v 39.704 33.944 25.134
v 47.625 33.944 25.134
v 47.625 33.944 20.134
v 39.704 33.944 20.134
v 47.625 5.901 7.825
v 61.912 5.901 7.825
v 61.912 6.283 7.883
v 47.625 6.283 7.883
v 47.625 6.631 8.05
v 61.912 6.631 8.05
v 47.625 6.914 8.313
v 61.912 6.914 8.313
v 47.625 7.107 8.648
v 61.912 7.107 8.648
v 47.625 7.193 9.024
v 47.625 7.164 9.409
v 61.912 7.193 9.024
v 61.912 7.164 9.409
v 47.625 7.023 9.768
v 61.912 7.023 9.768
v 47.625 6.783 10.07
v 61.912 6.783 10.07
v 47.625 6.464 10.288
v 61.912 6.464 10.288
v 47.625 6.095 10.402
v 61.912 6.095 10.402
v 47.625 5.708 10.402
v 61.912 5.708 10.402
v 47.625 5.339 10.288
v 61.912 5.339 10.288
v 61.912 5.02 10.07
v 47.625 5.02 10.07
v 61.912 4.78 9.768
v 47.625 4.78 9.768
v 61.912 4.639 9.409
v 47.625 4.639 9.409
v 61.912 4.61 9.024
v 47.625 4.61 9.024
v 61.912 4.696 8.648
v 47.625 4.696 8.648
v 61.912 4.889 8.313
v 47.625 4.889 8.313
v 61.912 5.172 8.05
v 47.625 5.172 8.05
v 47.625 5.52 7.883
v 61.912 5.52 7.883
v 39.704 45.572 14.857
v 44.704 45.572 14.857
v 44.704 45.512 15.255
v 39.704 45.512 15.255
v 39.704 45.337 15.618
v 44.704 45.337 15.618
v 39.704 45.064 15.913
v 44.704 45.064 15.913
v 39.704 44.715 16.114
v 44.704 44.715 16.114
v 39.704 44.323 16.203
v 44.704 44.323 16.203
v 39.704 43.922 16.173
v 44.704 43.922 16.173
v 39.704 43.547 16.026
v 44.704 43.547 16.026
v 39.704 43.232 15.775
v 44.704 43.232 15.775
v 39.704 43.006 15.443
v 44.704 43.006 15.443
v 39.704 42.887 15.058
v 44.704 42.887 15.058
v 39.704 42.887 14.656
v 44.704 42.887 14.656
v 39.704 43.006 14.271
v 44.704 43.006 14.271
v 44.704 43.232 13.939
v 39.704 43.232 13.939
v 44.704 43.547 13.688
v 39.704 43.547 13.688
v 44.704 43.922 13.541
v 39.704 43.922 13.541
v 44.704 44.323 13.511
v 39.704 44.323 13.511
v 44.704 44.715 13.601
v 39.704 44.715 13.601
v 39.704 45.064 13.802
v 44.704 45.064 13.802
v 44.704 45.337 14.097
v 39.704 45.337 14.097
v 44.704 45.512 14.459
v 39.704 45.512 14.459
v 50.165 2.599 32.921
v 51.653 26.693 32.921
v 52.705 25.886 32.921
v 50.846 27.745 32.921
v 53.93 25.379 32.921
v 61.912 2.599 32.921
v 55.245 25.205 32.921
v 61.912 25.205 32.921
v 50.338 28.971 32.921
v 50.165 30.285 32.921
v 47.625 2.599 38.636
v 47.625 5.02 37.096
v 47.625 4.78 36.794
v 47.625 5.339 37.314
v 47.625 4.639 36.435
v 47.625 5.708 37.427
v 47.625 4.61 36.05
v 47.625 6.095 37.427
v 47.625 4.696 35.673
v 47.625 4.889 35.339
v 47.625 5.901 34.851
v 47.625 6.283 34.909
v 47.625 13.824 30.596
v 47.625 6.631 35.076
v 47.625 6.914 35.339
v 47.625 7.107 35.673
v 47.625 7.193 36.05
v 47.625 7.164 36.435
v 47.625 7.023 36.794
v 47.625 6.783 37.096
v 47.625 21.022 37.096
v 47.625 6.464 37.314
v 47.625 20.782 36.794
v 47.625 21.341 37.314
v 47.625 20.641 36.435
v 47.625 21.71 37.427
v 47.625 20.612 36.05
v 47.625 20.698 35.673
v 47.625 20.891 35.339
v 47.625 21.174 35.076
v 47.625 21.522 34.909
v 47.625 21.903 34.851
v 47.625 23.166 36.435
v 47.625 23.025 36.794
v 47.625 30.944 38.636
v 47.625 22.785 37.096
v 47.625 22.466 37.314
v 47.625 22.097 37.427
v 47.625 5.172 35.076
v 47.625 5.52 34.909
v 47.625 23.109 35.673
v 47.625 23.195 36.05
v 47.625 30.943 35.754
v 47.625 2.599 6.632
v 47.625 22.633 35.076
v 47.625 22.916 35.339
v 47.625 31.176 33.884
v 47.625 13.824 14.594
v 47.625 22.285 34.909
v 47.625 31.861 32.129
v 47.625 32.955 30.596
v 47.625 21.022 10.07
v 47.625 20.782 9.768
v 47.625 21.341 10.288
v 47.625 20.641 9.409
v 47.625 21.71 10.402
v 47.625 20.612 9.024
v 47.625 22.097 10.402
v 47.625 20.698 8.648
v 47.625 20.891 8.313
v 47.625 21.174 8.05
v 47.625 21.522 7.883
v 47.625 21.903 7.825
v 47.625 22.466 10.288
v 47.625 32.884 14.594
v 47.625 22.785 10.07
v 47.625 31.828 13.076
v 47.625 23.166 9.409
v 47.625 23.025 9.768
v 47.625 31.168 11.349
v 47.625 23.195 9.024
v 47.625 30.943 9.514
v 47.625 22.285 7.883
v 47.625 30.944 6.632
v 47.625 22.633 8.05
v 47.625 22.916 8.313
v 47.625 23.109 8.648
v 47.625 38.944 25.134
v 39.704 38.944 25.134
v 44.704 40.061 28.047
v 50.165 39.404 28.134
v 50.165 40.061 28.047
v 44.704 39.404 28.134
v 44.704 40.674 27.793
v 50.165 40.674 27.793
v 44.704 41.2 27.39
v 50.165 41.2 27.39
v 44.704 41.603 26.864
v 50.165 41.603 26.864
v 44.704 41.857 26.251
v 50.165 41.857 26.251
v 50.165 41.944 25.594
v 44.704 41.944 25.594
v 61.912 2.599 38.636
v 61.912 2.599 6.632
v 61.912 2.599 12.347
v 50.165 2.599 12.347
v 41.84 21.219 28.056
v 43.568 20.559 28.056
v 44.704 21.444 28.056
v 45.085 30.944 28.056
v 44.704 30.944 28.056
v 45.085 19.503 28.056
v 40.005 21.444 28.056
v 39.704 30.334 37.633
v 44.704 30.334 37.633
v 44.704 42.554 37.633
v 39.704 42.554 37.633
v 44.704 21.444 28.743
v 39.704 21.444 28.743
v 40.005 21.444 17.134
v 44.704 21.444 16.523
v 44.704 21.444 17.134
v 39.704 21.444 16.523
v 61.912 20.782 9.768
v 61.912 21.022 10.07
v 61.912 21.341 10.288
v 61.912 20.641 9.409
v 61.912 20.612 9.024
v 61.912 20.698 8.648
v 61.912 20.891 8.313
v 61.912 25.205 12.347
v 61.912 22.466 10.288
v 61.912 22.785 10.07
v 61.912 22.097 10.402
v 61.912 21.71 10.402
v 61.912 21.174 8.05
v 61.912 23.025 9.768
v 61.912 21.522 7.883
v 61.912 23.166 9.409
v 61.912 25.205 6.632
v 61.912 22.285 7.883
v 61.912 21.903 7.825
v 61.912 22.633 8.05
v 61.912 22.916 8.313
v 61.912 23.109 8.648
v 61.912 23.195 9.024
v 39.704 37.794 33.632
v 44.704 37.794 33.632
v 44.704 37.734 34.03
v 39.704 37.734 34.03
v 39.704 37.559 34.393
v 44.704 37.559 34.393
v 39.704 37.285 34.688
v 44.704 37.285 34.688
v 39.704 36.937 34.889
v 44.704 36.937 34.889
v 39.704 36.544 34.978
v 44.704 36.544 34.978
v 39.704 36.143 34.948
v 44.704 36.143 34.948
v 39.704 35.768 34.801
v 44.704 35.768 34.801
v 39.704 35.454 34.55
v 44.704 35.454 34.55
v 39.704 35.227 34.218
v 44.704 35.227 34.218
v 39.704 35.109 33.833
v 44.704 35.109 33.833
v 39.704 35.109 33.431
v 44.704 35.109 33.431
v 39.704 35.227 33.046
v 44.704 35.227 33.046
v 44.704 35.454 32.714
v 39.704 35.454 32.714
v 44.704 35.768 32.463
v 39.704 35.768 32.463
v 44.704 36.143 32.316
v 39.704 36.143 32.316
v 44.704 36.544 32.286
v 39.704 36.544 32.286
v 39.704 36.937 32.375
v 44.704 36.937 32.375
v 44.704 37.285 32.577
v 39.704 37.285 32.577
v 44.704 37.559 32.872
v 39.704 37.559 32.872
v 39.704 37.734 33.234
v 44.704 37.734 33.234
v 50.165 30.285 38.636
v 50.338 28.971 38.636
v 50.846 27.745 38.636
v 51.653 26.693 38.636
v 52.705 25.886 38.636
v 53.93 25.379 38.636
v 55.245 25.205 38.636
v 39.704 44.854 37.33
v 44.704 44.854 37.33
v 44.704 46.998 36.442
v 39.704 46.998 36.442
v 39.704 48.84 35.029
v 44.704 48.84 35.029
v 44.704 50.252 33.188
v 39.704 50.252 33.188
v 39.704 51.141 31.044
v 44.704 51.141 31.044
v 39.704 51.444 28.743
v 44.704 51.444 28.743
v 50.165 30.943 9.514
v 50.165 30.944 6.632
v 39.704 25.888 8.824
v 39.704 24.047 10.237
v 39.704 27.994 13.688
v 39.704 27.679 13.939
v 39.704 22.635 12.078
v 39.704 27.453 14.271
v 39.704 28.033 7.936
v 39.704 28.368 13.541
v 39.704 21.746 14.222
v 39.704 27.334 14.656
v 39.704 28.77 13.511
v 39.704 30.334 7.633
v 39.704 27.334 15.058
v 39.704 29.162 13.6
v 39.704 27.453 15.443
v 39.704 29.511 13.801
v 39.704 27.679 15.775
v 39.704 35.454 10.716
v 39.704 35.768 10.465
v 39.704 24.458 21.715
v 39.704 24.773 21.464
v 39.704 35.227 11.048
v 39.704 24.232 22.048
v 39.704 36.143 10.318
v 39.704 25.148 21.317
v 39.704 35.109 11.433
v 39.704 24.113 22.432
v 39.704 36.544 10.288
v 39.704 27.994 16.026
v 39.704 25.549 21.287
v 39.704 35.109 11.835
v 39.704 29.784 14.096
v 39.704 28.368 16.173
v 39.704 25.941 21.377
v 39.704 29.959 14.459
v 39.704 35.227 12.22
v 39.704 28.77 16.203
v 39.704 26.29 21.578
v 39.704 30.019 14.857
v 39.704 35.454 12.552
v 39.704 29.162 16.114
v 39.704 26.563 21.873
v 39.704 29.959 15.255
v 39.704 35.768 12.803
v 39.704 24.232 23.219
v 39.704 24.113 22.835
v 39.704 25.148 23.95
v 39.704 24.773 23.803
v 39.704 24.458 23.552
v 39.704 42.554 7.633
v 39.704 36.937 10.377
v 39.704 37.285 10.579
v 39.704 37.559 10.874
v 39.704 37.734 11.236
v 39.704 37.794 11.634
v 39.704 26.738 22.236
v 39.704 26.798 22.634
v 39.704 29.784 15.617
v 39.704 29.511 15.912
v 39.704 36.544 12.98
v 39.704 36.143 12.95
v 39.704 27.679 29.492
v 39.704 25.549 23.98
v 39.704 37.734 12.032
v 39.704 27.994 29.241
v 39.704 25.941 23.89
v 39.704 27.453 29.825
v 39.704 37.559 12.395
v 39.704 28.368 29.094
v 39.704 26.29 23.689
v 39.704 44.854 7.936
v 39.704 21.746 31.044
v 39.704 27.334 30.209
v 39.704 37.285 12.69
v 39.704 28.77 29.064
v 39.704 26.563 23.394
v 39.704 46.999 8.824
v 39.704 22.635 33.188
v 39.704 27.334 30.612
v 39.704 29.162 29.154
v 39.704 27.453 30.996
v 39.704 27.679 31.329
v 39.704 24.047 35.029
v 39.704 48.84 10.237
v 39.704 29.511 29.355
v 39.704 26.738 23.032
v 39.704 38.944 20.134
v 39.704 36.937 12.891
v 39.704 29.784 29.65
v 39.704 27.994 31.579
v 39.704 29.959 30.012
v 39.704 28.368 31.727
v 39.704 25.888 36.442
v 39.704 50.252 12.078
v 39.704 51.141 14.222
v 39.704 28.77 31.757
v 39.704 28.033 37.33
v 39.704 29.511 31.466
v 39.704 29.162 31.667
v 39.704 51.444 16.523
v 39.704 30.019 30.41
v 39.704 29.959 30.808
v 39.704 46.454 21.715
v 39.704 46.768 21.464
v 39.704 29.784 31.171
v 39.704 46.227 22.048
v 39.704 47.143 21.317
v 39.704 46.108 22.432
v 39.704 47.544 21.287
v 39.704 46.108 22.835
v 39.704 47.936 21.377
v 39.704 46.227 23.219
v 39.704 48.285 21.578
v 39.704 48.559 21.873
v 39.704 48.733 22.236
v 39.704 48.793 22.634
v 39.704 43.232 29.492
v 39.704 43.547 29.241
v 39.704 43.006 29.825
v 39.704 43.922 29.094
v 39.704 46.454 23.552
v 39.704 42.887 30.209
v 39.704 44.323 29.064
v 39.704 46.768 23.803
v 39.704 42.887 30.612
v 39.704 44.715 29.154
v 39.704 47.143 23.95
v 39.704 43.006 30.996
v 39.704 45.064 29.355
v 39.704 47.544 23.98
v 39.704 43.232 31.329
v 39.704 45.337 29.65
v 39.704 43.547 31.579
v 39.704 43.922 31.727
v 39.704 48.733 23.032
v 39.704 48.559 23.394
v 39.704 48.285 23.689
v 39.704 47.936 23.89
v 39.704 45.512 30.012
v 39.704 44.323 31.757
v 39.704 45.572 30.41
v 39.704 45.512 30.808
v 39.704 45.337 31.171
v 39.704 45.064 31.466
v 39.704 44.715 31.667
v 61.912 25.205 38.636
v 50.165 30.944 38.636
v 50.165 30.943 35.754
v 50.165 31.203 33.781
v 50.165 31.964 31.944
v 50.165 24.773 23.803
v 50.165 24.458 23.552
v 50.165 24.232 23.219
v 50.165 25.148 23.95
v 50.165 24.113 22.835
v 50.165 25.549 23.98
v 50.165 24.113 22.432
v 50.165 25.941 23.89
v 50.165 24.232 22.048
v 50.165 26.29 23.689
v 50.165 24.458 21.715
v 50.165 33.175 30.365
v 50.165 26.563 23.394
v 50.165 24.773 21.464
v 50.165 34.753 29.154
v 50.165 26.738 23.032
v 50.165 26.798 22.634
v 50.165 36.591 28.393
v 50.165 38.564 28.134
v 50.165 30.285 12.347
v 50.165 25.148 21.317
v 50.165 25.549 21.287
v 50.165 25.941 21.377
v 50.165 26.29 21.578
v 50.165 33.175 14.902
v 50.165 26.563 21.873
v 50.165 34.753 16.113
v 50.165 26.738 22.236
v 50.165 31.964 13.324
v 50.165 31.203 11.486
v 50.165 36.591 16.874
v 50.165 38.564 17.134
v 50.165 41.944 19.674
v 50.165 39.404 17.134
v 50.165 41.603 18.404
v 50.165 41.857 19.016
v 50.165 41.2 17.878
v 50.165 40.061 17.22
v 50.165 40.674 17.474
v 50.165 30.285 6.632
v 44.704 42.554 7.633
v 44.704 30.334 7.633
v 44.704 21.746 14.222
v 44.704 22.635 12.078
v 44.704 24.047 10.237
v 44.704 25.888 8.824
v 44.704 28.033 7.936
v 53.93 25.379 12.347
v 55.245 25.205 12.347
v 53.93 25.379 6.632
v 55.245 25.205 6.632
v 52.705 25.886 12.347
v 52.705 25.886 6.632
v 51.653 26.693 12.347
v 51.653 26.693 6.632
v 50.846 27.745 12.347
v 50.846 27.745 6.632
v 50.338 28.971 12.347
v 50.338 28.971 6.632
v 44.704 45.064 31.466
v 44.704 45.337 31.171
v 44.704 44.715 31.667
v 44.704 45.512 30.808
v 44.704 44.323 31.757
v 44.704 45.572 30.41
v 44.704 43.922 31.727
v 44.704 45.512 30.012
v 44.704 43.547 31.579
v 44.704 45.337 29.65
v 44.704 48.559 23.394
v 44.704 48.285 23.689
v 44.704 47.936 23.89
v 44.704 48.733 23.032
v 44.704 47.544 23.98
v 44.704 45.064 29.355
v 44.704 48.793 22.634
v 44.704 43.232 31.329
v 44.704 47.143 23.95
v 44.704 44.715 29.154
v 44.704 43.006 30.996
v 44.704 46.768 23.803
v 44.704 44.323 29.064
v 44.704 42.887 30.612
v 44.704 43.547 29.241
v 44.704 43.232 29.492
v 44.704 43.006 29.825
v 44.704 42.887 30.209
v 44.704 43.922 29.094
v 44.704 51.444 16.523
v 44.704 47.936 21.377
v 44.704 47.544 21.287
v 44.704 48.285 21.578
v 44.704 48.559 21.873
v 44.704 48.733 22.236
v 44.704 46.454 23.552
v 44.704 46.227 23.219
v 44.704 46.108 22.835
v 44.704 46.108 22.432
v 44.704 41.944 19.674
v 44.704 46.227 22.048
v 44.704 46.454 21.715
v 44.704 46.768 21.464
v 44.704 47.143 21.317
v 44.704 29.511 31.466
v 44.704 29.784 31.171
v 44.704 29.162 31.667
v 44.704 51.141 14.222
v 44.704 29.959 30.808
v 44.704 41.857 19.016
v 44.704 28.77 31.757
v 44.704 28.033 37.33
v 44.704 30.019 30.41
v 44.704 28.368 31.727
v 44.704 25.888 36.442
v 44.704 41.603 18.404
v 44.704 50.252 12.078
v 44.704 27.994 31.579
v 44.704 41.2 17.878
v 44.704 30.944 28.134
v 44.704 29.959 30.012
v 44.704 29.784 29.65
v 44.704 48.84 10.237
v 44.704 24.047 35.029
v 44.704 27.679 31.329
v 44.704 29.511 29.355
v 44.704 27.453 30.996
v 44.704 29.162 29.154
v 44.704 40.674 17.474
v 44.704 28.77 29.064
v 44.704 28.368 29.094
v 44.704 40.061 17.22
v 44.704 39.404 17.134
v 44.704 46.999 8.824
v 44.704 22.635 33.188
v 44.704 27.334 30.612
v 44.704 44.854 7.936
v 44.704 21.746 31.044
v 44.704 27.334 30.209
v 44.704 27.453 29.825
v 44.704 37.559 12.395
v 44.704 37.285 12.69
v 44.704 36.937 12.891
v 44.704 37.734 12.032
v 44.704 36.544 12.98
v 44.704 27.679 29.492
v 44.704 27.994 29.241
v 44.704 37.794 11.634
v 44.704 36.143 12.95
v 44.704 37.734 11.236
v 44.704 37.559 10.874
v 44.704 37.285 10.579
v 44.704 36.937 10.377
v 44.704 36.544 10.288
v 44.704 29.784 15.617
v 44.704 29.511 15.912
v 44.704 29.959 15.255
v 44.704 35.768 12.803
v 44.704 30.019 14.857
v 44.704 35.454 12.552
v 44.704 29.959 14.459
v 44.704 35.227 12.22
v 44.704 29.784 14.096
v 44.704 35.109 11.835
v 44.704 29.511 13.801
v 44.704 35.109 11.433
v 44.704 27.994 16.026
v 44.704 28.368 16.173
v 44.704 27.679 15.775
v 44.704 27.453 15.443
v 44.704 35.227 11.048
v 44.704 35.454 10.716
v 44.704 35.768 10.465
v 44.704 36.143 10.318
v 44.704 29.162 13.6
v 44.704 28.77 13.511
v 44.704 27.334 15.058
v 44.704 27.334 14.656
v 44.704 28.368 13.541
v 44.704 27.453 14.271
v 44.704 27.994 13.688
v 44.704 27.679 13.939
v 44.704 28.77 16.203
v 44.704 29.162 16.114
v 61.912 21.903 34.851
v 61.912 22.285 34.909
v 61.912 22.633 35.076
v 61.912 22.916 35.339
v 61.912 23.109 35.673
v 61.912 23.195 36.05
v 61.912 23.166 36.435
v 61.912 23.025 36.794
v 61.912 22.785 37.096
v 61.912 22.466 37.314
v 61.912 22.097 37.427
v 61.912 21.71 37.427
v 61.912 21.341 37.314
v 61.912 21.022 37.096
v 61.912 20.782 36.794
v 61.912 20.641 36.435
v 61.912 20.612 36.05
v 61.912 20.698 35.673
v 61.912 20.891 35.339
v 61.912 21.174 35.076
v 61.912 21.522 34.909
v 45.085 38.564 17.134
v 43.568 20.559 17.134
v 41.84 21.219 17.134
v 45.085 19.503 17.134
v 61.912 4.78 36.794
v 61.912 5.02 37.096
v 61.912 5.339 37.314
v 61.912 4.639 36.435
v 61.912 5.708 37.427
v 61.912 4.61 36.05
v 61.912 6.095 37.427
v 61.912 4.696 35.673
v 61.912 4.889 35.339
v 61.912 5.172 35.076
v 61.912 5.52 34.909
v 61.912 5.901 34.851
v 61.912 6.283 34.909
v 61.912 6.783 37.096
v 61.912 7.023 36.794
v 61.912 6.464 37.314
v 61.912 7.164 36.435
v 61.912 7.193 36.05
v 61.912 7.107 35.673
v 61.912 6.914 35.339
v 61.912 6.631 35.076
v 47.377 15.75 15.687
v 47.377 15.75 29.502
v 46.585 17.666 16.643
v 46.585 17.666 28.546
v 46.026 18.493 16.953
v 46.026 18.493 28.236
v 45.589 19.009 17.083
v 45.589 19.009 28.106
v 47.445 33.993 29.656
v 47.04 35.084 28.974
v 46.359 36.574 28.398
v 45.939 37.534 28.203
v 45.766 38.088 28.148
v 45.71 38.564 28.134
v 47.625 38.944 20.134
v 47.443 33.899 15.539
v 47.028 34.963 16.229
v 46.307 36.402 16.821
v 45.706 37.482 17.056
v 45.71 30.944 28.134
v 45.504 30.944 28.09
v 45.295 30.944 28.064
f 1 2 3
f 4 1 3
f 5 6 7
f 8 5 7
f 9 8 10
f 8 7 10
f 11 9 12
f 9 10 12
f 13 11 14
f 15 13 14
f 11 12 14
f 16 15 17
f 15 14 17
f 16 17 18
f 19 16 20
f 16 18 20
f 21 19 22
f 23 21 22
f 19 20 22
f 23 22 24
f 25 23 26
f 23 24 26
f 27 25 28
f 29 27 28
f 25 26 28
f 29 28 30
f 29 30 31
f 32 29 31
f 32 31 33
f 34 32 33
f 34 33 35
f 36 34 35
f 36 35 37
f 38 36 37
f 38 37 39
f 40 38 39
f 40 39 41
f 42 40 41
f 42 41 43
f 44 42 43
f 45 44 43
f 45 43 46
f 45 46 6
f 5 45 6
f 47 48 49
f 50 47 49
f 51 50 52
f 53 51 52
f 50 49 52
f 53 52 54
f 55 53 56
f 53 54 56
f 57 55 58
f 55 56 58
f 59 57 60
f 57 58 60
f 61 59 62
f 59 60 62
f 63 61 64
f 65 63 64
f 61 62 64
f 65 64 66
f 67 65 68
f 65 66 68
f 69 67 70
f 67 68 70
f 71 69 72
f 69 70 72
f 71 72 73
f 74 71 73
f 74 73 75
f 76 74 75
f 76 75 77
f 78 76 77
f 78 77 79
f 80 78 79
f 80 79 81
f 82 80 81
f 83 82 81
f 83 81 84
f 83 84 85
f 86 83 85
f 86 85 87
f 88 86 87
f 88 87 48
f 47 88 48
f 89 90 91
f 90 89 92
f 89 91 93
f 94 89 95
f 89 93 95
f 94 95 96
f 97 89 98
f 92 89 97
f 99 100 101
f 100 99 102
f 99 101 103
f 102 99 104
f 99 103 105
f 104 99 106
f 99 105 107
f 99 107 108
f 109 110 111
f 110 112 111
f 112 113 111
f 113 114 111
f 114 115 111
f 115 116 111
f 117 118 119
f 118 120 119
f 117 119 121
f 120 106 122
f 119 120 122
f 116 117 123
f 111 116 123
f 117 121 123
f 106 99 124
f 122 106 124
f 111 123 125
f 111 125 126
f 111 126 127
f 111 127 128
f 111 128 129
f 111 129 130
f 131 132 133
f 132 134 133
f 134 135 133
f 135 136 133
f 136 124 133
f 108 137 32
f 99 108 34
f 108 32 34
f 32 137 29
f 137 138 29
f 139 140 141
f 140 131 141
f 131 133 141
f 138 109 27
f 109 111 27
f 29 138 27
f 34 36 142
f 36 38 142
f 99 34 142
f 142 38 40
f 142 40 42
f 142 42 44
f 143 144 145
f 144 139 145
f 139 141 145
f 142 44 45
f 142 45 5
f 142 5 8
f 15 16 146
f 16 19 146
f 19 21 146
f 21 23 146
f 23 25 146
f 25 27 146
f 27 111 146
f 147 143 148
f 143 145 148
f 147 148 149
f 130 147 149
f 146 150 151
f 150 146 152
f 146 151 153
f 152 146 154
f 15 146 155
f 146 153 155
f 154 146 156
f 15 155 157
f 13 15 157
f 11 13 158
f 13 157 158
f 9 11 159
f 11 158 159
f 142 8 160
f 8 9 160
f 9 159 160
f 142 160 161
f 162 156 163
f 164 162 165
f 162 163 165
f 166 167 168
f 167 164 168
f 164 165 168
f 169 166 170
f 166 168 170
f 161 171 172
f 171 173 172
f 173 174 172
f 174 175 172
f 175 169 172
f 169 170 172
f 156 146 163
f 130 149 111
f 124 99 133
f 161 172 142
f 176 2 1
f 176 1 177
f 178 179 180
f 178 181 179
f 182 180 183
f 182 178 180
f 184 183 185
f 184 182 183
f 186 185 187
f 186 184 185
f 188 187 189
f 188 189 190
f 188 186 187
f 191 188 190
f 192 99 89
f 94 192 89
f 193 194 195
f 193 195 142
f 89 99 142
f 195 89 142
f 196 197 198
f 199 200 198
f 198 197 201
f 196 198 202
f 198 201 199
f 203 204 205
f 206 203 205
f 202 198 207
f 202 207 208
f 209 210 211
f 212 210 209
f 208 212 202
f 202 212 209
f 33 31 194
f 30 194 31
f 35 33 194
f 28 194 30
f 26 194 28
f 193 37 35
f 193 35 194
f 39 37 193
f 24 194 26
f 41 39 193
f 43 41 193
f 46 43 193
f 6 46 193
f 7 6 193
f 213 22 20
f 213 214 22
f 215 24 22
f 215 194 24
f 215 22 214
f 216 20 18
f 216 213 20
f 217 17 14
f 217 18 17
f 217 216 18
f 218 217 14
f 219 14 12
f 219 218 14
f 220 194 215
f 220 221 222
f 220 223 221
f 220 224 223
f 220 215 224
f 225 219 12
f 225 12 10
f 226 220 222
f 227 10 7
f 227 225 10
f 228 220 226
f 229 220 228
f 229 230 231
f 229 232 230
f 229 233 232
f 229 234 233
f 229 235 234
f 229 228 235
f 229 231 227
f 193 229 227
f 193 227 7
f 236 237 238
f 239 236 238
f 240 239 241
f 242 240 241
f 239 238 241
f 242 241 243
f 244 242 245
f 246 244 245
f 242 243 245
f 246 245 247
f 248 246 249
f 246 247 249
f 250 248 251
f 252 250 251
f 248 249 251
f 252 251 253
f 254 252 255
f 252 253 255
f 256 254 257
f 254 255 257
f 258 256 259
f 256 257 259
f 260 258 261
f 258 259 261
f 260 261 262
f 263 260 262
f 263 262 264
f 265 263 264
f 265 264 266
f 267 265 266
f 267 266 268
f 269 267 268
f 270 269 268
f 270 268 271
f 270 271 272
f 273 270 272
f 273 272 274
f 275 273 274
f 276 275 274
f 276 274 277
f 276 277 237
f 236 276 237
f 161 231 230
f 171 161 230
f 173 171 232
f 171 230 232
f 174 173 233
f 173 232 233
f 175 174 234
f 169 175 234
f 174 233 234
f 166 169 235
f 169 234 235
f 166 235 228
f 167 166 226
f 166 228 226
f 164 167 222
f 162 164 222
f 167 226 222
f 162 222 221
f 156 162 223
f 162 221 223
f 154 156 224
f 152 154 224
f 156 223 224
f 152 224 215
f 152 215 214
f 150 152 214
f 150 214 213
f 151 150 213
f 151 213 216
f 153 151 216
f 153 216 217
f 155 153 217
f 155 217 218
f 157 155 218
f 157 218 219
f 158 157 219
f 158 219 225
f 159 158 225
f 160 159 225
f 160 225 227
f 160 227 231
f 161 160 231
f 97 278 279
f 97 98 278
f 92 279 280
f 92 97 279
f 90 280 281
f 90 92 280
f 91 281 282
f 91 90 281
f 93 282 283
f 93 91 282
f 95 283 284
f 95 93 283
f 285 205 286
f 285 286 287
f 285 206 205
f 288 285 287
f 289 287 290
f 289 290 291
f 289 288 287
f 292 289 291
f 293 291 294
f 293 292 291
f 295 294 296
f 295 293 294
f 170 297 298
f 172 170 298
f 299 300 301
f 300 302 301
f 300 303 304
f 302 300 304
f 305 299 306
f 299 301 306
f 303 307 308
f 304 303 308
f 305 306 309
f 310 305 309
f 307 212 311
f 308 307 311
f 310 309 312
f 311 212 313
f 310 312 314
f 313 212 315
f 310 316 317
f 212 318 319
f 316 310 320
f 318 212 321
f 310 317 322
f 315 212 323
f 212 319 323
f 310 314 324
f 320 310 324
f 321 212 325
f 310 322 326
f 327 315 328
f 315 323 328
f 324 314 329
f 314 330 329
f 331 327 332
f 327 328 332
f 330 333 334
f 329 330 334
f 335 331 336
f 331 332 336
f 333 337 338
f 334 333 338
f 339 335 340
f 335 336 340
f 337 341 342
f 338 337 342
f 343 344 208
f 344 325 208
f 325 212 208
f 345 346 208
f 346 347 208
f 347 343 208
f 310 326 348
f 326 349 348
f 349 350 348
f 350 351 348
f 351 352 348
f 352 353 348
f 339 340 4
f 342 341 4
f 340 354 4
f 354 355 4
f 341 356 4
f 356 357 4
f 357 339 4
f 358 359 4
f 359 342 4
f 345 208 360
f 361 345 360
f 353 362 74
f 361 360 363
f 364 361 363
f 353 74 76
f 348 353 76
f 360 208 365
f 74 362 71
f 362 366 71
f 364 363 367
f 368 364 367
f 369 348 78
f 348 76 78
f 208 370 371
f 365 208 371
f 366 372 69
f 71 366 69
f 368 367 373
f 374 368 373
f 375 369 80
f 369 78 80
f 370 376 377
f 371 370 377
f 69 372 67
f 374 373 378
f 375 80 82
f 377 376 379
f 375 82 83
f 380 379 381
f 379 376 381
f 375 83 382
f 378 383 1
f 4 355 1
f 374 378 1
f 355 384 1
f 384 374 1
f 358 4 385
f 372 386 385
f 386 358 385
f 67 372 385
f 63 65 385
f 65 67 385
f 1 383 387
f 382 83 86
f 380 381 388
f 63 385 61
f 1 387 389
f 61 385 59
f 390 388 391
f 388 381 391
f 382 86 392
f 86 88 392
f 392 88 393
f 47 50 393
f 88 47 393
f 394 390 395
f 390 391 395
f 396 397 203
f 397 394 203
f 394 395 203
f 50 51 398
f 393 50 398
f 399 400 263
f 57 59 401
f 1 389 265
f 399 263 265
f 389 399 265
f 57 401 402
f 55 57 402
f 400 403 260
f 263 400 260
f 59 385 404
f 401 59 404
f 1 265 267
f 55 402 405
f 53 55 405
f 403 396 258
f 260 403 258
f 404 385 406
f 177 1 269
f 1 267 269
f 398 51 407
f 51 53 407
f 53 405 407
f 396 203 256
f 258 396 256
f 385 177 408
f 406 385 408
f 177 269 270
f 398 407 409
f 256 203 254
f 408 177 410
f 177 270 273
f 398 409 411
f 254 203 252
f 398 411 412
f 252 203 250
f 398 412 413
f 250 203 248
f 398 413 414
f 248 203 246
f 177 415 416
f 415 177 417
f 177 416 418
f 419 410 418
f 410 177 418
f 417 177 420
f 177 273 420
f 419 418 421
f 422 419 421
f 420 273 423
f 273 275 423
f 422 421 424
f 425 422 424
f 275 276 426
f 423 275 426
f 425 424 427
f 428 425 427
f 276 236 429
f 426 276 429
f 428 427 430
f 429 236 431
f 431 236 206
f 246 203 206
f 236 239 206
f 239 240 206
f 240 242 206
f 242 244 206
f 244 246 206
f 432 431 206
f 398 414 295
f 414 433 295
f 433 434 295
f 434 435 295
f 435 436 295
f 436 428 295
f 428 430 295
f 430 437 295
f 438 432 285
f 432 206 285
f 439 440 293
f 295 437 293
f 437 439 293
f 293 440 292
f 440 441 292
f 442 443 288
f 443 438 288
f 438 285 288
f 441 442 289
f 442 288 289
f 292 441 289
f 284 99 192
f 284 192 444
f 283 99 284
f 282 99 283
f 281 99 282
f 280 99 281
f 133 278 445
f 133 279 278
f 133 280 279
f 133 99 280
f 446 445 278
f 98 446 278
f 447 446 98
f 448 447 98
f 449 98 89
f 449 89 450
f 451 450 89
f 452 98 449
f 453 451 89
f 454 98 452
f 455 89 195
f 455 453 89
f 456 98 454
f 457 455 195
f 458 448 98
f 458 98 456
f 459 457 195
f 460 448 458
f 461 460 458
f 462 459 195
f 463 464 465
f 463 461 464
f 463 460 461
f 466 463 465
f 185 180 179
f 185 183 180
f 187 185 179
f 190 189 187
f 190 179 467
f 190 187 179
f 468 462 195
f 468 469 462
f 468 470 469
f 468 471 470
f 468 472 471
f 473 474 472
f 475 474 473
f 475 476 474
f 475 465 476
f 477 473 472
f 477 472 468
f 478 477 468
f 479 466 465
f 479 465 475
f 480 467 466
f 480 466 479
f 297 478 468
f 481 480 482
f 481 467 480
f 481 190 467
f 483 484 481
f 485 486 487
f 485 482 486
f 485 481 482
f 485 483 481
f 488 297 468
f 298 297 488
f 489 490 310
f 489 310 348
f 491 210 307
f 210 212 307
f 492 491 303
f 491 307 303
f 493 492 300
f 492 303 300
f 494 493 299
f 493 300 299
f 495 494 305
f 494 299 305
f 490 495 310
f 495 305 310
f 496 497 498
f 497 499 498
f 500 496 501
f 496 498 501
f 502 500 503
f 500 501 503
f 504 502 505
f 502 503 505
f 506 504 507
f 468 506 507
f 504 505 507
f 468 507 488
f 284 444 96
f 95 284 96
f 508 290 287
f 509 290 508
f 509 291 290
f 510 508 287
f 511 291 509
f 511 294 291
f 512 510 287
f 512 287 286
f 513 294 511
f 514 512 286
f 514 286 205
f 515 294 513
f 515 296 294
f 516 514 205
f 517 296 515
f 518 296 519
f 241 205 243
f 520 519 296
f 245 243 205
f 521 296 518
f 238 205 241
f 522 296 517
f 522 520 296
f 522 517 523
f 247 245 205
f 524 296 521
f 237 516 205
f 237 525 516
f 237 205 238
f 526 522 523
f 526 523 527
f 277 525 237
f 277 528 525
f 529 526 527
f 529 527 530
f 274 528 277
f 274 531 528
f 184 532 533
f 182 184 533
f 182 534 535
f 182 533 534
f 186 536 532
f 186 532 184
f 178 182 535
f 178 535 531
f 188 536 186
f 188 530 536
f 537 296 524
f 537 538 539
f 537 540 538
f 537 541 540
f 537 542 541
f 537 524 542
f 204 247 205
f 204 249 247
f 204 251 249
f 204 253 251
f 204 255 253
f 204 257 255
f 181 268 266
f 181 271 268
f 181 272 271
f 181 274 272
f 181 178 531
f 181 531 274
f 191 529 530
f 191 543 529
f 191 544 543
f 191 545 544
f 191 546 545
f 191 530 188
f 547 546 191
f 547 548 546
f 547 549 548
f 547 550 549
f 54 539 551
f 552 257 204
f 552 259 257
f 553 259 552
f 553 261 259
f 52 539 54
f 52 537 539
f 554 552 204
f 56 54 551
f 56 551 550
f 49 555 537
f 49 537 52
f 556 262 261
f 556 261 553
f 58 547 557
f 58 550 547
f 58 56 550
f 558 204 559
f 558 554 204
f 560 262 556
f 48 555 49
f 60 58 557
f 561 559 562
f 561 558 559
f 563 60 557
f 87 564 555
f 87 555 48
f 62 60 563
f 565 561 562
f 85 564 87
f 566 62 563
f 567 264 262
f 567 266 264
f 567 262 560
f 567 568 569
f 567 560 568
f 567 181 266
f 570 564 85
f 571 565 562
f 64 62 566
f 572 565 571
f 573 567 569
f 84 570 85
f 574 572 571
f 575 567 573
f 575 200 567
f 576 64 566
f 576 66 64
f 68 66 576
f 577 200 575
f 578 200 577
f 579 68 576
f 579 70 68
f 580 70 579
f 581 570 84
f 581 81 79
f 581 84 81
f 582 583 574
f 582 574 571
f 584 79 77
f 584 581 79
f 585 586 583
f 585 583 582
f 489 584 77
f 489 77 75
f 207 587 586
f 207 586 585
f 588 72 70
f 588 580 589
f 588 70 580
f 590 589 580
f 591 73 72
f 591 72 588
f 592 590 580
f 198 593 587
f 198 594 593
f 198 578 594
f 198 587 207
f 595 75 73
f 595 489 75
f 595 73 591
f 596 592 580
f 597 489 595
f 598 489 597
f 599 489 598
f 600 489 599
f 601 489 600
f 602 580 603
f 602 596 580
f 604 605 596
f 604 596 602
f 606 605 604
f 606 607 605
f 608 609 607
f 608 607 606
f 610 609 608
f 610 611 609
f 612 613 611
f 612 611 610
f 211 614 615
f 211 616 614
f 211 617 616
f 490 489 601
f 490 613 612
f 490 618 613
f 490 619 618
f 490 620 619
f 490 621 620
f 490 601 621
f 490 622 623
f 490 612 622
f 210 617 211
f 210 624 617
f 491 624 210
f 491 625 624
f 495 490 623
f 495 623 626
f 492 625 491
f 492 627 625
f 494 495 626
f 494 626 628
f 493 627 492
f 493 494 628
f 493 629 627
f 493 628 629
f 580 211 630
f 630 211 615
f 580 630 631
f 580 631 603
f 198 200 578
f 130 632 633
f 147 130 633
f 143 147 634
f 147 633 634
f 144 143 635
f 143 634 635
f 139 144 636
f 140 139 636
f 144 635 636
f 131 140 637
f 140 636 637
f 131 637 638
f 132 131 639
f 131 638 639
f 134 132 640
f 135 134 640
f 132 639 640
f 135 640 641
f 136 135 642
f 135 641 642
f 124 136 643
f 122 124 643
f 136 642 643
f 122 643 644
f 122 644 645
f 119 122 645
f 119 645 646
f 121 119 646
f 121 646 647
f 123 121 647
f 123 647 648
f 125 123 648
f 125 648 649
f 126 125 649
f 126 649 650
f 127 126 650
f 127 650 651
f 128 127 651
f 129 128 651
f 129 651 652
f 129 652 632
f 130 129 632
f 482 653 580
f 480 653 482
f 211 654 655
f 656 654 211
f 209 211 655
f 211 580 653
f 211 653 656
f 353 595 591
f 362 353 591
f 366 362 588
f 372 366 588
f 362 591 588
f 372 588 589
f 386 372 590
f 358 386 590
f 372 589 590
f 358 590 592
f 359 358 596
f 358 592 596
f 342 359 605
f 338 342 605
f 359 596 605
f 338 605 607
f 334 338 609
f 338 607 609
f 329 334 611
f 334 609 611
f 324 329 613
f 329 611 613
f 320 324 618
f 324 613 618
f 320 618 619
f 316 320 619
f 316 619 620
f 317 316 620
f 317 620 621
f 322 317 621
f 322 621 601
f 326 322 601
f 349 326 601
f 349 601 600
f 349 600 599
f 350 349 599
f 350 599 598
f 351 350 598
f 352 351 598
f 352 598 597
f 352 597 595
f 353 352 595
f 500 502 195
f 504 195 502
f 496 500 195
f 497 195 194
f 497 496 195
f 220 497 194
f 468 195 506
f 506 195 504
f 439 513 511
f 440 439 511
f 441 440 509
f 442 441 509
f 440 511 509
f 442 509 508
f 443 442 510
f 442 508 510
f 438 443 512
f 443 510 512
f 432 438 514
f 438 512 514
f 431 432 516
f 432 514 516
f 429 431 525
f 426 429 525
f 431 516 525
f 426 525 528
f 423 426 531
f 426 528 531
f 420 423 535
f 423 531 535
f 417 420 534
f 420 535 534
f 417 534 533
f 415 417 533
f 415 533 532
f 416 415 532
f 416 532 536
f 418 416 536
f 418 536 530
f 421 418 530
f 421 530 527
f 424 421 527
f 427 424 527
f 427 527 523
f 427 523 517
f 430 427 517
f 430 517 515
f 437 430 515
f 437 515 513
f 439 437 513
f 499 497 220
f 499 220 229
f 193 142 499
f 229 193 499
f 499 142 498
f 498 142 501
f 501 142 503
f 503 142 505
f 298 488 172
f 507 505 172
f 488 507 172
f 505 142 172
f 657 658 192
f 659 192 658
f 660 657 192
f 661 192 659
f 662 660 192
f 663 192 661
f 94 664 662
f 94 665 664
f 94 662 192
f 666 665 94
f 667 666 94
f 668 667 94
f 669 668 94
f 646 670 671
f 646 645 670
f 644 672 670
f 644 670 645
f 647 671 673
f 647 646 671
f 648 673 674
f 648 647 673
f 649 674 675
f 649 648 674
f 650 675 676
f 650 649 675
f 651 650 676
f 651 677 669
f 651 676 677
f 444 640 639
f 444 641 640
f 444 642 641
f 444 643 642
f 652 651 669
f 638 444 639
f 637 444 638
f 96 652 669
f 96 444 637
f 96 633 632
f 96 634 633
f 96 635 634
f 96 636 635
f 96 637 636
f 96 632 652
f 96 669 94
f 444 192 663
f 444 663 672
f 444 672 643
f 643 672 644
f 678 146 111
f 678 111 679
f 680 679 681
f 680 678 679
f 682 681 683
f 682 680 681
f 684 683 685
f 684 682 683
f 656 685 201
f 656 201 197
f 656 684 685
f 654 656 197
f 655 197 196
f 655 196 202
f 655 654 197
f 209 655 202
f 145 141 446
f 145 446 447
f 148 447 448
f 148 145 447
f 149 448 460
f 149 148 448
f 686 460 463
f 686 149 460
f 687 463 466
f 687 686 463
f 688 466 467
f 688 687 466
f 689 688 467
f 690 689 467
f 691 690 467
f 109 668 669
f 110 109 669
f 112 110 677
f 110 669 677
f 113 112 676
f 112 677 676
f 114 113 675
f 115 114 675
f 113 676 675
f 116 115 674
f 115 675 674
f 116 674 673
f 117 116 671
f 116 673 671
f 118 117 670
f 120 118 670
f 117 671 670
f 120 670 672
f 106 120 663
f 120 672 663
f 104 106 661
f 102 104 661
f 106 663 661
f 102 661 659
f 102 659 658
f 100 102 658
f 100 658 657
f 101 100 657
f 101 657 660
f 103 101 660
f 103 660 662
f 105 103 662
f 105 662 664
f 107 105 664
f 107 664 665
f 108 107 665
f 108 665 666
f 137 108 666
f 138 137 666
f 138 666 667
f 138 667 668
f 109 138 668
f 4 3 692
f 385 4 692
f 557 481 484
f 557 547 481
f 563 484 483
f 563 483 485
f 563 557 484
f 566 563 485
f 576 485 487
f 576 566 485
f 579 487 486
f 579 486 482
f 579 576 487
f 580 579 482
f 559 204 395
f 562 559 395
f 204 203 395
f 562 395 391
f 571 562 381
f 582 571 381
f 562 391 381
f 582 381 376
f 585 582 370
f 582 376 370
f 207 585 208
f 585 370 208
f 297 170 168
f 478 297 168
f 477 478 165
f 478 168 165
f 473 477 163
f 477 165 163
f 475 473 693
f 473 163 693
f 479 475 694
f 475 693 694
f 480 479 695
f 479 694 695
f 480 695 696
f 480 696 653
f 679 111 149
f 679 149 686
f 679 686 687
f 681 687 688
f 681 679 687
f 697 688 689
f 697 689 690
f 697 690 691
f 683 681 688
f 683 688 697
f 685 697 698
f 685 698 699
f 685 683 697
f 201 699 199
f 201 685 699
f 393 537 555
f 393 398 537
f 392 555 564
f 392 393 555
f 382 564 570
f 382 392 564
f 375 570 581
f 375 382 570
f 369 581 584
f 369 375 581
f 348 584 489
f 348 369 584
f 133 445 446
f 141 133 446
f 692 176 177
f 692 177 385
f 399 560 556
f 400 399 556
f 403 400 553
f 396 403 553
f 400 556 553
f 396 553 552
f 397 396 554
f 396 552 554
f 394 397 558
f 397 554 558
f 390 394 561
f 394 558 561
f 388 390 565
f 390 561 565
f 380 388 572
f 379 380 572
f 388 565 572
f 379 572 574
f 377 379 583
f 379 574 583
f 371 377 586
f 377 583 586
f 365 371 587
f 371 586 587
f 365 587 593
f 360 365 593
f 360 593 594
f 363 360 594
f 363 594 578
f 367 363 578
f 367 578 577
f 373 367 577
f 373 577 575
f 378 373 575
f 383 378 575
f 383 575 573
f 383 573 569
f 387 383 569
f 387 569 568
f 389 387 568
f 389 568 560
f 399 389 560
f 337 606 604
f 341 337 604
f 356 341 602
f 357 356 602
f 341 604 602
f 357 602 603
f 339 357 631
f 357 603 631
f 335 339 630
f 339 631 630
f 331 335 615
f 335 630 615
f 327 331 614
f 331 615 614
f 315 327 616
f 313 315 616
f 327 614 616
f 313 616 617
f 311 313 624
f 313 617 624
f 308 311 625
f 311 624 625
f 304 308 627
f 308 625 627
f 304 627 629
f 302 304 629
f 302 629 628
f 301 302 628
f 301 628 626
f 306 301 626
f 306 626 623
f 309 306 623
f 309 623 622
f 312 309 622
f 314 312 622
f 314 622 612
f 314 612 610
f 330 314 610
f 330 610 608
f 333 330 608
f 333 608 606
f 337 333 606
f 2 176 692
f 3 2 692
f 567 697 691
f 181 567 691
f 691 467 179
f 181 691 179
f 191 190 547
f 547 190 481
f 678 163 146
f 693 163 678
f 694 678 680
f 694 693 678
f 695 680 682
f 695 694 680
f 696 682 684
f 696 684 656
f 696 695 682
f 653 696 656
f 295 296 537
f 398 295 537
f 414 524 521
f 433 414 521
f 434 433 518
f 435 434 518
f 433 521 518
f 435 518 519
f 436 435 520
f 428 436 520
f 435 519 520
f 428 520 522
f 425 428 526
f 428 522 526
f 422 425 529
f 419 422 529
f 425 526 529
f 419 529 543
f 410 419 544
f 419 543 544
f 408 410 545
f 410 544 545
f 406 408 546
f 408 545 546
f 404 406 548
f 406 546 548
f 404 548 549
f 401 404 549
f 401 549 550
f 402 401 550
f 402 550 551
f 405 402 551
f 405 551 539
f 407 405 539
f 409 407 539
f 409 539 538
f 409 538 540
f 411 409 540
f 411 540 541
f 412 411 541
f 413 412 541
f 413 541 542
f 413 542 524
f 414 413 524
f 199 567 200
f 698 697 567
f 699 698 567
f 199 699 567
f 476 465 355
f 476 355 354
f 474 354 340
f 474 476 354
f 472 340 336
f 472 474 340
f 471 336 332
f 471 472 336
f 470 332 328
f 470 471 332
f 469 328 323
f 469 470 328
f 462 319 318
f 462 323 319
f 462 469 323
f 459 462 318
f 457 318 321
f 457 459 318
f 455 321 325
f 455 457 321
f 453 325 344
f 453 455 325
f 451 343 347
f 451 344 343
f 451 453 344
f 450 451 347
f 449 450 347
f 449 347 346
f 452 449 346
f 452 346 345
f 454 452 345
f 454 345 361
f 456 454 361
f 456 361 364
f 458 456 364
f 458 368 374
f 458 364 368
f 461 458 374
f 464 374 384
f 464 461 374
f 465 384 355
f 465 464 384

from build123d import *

# Parameters (mm, degrees)
BOSS_EXTRUDE1_DEPTH = 45
SKETCH4_R           = 1.35
CUT_EXTRUDE3_DEPTH  = 88.759301296
SKETCH16_W          = 54.601375451
SKETCH16_H          = 80.563035577
CUT_EXTRUDE6_DEPTH  = 86.719849393
SKETCH17_W          = 45
SKETCH17_H          = 36.75
SKETCH17_W_2        = 30
SKETCH17_H_2        = 30
CUT_EXTRUDE7_DEPTH  = 74.310606081
SKETCH18_R          = 1.35
CUT_EXTRUDE8_DEPTH  = 64.93499752
FILLET1_R           = 8.89
SKETCH19_W          = 11
SKETCH19_H          = 11
BOSS_EXTRUDE2_DEPTH = 2.921
SKETCH20_W          = 5
SKETCH20_H          = 5
CUT_EXTRUDE9_DEPTH  = 25
SKETCH26_W          = 32.004
SKETCH26_H          = 43.2054
BOSS_EXTRUDE3_DEPTH = 2.54
SKETCH27_W          = 32.004
SKETCH27_H          = 22.606
BOSS_EXTRUDE4_DEPTH = 11.7475
SKETCH28_R          = 1.2954
CUT_EXTRUDE11_DEPTH = 19.05
CUT_EXTRUDE14_DEPTH = 3.81
SKETCH32_W          = 2.921
SKETCH32_H          = 9.5
BOSS_EXTRUDE5_DEPTH = 10.922
SKETCH33_W          = 11.7475
SKETCH33_H          = 20.574
CUT_EXTRUDE15_DEPTH = 78.55193447
FILLET2_R           = 5.08
FILLET3_R           = 5.08
FILLET4_R           = 7.62
FILLET5_R           = 7.62
FILLET6_R           = 7.62
FILLET7_R           = 2.54
FILLET8_R           = 2.54
FILLET9_R           = 2.54
FILLET10_R          = 2.54
CUT_EXTRUDE16_START = -11.43
SKETCH34_R          = 1.35
CUT_EXTRUDE16_DEPTH = 11.43


with BuildPart() as part:
    # Sketch1 → Boss-Extrude1 (new body)
    with BuildSketch(Plane.XY):
        Polygon((-3.796, -4.492), (-3.796, 57.658), (44.704, 57.658), (44.704, 20.908), (39.704, 20.908), (39.704, 52.658), (1.204, 52.658), (1.204, -4.492), align=None)
    extrude(amount=BOSS_EXTRUDE1_DEPTH)

    # Sketch4 → Cut-Extrude3 (cut, through all)
    with BuildSketch(Plane(origin=(44.704, 0, 0), x_dir=(0, 0, -1), z_dir=(1, 0, 0))):
        with Locations(Location((-22.6336, 47.4432, 0), (0, 0, 90))):
            Circle(SKETCH4_R)
        with Locations(Location((-22.6336, 25.448, 0), (0, 0, 90))):
            Circle(SKETCH4_R)
        with Locations(Location((-11.6341, 36.4435, 0), (0, 0, 90))):
            Circle(SKETCH4_R)
        with Locations(Location((-33.6321, 36.4435, 0), (0, 0, 90))):
            Circle(SKETCH4_R)
    extrude(amount=-CUT_EXTRUDE3_DEPTH, mode=Mode.SUBTRACT)

    # Sketch16 → Cut-Extrude6 (cut, through all)
    with BuildSketch(Plane.XY.offset(45)):
        with Locations((12.403312274, 23.911522997)):
            Rectangle(SKETCH16_W, SKETCH16_H)
    extrude(amount=-CUT_EXTRUDE6_DEPTH, mode=Mode.SUBTRACT)

    # Sketch17 → Cut-Extrude7 (cut, through all)
    with BuildSketch(Plane(origin=(44.704, 0, 0), x_dir=(0, 0, -1), z_dir=(1, 0, 0))):
        with Locations((-22.5, 39.283)):
            Rectangle(SKETCH17_W, SKETCH17_H)
        with Locations((-22.6331, 36.4435)):
            Rectangle(SKETCH17_W_2, SKETCH17_H_2, mode=Mode.SUBTRACT)
    extrude(amount=-CUT_EXTRUDE7_DEPTH, mode=Mode.SUBTRACT)

    # Sketch18 → Cut-Extrude8 (cut, through all)
    with BuildSketch(Plane(origin=(44.704, 0, 0), x_dir=(0, 0, -1), z_dir=(1, 0, 0))):
        with Locations(Location((-14.857193174, 44.222006826, 0), (0, 0, 90))):
            Circle(SKETCH18_R)
        with Locations(Location((-30.410360379, 28.668839621, 0), (0, 0, 90))):
            Circle(SKETCH18_R)
        with Locations(Location((-14.856839621, 28.668839621, 0), (0, 0, 90))):
            Circle(SKETCH18_R)
        with Locations(Location((-30.410360379, 44.222006826, 0), (0, 0, 90))):
            Circle(SKETCH18_R)
    extrude(amount=-CUT_EXTRUDE8_DEPTH, mode=Mode.SUBTRACT)

    # Fillet1
    fillet1_edges = [part.edges().sort_by_distance(p)[0] for p in [
        (42.204, 51.4435, 7.6331),
        (42.204, 51.4435, 37.6331),
        (42.204, 21.4435, 37.6331),
        (42.204, 21.4435, 7.6331),
    ]]
    fillet(fillet1_edges, radius=FILLET1_R)

    # Sketch19 → Boss-Extrude2 (add)
    with BuildSketch(Plane(origin=(44.704, 0, 0), x_dir=(0, 0, -1), z_dir=(1, 0, 0))):
        with Locations((-22.6336, 36.4435)):
            Rectangle(SKETCH19_W, SKETCH19_H)
    extrude(amount=BOSS_EXTRUDE2_DEPTH)

    # Sketch20 → Cut-Extrude9 (cut)
    with BuildSketch(Plane(origin=(47.625, 0, 0), x_dir=(0, 0, -1), z_dir=(1, 0, 0))):
        with Locations((-22.6336, 36.4435)):
            Rectangle(SKETCH20_W, SKETCH20_H)
    extrude(amount=-CUT_EXTRUDE9_DEPTH, mode=Mode.SUBTRACT)

    # Sketch26 → Boss-Extrude3 (add)
    with BuildSketch(Plane(origin=(47.625, 0, 0), x_dir=(0, 0, -1), z_dir=(1, 0, 0))):
        with Locations((-22.6336, 24.202149454)):
            Rectangle(SKETCH26_W, SKETCH26_H)
    extrude(amount=BOSS_EXTRUDE3_DEPTH)

    # Sketch27 → Boss-Extrude4 (add)
    with BuildSketch(Plane(origin=(50.165, 0, 0), x_dir=(0, 0, -1), z_dir=(1, 0, 0))):
        with Locations((-22.6336, 13.902449454)):
            Rectangle(SKETCH27_W, SKETCH27_H)
    extrude(amount=BOSS_EXTRUDE4_DEPTH)

    # Sketch28 → Cut-Extrude11 (cut)
    with BuildSketch(Plane(origin=(61.9125, 0, 0), x_dir=(0, 0, -1), z_dir=(1, 0, 0))):
        with Locations((-9.1208, 21.903449454)):
            Circle(SKETCH28_R)
        with Locations((-9.1208, 5.901449454)):
            Circle(SKETCH28_R)
        with Locations((-36.1464, 5.901449454)):
            Circle(SKETCH28_R)
        with Locations((-36.1464, 21.903449454)):
            Circle(SKETCH28_R)
    extrude(amount=-CUT_EXTRUDE11_DEPTH, mode=Mode.SUBTRACT)

    # Sketch31 → Cut-Extrude14 (cut)
    with BuildSketch(Plane(origin=(50.165, 0, 0), x_dir=(0, 0, -1), z_dir=(1, 0, 0))):
        Polygon((-38.6356, 45.804849454), (-38.6356, 30.9435), (-28.1336, 30.9435), (-28.1336, 41.9435), (-17.1336, 41.9435), (-17.1336, 30.9435), (-6.6316, 30.9435), (-6.6316, 45.804849454), align=None)
    extrude(amount=-CUT_EXTRUDE14_DEPTH, mode=Mode.SUBTRACT)

    # Sketch32 → Boss-Extrude5 (add)
    with BuildSketch(Plane(origin=(0, 0, 17.1336), x_dir=(-1, 0, 0), z_dir=(0, 0, -1))):
        with Locations((-46.1645, 26.1935)):
            Rectangle(SKETCH32_W, SKETCH32_H)
    extrude(amount=-BOSS_EXTRUDE5_DEPTH)

    # Sketch33 → Cut-Extrude15 (cut, through all)
    with BuildSketch(Plane(origin=(0, 25.205449454, 0), x_dir=(1, 0, 0), z_dir=(0, 1, 0))):
        with Locations((56.03875, -22.6336)):
            Rectangle(SKETCH33_W, SKETCH33_H)
    extrude(amount=-CUT_EXTRUDE15_DEPTH, mode=Mode.SUBTRACT)

    # Fillet2
    fillet2_edges = [part.edges().sort_by_distance(p)[0] for p in [
        (50.165, 25.205449454, 35.7781),
    ]]
    fillet(fillet2_edges, radius=FILLET2_R)

    # Fillet3
    fillet3_edges = [part.edges().sort_by_distance(p)[0] for p in [
        (50.165, 25.205449454, 9.4891),
    ]]
    fillet(fillet3_edges, radius=FILLET3_R)

    # Fillet4
    # the kernel refuses this fillet: 7.62 mm, written as the material it adds along each edge
    with BuildSketch(Plane(origin=(47.625, 21.4435, 17.1336), x_dir=(-1, 0, 0), z_dir=(0, 0, 1))) as fillet4_piece_1:
        with BuildLine():
            CenterArc((FILLET4_R, FILLET4_R), FILLET4_R, 180, 90)
            Line((0, FILLET4_R), (0, 0))
            Line((0, 0), (FILLET4_R, 0))
        make_face()
    extrude(amount=10.922)

    # Fillet5
    fillet5_edges = [part.edges().sort_by_distance(p)[0] for p in [
        (48.895, 30.9435, 17.1336),
    ]]
    fillet(fillet5_edges, radius=FILLET5_R)

    # Fillet6
    fillet6_edges = [part.edges().sort_by_distance(p)[0] for p in [
        (48.895, 30.9435, 28.1336),
    ]]
    fillet(fillet6_edges, radius=FILLET6_R)

    # Fillet7
    fillet7_edges = [part.edges().sort_by_distance(p)[0] for p in [
        (47.4345, 41.9435, 28.1336),
    ]]
    fillet(fillet7_edges, radius=FILLET7_R)

    # Fillet8
    fillet8_edges = [part.edges().sort_by_distance(p)[0] for p in [
        (47.4345, 41.9435, 17.1336),
    ]]
    fillet(fillet8_edges, radius=FILLET8_R)

    # Fillet9
    fillet9_edges = [part.edges().sort_by_distance(p)[0] for p in [
        (47.625, 22.3835, 28.0556),
    ]]
    fillet(fillet9_edges, radius=FILLET9_R)

    # Fillet10
    fillet10_edges = [part.edges().sort_by_distance(p)[0] for p in [
        (47.625, 26.1935, 17.1336),
    ]]
    fillet(fillet10_edges, radius=FILLET10_R)

    # Sketch34 → Cut-Extrude16 (cut)
    with BuildSketch(Plane.ZY.offset(-39.704).offset(CUT_EXTRUDE16_START)):
        with Locations(Location((22.6336, 25.448, 0), (0, 0, 90))):
            Circle(SKETCH34_R)
    extrude(amount=CUT_EXTRUDE16_DEPTH, mode=Mode.SUBTRACT)


solid = part.part
